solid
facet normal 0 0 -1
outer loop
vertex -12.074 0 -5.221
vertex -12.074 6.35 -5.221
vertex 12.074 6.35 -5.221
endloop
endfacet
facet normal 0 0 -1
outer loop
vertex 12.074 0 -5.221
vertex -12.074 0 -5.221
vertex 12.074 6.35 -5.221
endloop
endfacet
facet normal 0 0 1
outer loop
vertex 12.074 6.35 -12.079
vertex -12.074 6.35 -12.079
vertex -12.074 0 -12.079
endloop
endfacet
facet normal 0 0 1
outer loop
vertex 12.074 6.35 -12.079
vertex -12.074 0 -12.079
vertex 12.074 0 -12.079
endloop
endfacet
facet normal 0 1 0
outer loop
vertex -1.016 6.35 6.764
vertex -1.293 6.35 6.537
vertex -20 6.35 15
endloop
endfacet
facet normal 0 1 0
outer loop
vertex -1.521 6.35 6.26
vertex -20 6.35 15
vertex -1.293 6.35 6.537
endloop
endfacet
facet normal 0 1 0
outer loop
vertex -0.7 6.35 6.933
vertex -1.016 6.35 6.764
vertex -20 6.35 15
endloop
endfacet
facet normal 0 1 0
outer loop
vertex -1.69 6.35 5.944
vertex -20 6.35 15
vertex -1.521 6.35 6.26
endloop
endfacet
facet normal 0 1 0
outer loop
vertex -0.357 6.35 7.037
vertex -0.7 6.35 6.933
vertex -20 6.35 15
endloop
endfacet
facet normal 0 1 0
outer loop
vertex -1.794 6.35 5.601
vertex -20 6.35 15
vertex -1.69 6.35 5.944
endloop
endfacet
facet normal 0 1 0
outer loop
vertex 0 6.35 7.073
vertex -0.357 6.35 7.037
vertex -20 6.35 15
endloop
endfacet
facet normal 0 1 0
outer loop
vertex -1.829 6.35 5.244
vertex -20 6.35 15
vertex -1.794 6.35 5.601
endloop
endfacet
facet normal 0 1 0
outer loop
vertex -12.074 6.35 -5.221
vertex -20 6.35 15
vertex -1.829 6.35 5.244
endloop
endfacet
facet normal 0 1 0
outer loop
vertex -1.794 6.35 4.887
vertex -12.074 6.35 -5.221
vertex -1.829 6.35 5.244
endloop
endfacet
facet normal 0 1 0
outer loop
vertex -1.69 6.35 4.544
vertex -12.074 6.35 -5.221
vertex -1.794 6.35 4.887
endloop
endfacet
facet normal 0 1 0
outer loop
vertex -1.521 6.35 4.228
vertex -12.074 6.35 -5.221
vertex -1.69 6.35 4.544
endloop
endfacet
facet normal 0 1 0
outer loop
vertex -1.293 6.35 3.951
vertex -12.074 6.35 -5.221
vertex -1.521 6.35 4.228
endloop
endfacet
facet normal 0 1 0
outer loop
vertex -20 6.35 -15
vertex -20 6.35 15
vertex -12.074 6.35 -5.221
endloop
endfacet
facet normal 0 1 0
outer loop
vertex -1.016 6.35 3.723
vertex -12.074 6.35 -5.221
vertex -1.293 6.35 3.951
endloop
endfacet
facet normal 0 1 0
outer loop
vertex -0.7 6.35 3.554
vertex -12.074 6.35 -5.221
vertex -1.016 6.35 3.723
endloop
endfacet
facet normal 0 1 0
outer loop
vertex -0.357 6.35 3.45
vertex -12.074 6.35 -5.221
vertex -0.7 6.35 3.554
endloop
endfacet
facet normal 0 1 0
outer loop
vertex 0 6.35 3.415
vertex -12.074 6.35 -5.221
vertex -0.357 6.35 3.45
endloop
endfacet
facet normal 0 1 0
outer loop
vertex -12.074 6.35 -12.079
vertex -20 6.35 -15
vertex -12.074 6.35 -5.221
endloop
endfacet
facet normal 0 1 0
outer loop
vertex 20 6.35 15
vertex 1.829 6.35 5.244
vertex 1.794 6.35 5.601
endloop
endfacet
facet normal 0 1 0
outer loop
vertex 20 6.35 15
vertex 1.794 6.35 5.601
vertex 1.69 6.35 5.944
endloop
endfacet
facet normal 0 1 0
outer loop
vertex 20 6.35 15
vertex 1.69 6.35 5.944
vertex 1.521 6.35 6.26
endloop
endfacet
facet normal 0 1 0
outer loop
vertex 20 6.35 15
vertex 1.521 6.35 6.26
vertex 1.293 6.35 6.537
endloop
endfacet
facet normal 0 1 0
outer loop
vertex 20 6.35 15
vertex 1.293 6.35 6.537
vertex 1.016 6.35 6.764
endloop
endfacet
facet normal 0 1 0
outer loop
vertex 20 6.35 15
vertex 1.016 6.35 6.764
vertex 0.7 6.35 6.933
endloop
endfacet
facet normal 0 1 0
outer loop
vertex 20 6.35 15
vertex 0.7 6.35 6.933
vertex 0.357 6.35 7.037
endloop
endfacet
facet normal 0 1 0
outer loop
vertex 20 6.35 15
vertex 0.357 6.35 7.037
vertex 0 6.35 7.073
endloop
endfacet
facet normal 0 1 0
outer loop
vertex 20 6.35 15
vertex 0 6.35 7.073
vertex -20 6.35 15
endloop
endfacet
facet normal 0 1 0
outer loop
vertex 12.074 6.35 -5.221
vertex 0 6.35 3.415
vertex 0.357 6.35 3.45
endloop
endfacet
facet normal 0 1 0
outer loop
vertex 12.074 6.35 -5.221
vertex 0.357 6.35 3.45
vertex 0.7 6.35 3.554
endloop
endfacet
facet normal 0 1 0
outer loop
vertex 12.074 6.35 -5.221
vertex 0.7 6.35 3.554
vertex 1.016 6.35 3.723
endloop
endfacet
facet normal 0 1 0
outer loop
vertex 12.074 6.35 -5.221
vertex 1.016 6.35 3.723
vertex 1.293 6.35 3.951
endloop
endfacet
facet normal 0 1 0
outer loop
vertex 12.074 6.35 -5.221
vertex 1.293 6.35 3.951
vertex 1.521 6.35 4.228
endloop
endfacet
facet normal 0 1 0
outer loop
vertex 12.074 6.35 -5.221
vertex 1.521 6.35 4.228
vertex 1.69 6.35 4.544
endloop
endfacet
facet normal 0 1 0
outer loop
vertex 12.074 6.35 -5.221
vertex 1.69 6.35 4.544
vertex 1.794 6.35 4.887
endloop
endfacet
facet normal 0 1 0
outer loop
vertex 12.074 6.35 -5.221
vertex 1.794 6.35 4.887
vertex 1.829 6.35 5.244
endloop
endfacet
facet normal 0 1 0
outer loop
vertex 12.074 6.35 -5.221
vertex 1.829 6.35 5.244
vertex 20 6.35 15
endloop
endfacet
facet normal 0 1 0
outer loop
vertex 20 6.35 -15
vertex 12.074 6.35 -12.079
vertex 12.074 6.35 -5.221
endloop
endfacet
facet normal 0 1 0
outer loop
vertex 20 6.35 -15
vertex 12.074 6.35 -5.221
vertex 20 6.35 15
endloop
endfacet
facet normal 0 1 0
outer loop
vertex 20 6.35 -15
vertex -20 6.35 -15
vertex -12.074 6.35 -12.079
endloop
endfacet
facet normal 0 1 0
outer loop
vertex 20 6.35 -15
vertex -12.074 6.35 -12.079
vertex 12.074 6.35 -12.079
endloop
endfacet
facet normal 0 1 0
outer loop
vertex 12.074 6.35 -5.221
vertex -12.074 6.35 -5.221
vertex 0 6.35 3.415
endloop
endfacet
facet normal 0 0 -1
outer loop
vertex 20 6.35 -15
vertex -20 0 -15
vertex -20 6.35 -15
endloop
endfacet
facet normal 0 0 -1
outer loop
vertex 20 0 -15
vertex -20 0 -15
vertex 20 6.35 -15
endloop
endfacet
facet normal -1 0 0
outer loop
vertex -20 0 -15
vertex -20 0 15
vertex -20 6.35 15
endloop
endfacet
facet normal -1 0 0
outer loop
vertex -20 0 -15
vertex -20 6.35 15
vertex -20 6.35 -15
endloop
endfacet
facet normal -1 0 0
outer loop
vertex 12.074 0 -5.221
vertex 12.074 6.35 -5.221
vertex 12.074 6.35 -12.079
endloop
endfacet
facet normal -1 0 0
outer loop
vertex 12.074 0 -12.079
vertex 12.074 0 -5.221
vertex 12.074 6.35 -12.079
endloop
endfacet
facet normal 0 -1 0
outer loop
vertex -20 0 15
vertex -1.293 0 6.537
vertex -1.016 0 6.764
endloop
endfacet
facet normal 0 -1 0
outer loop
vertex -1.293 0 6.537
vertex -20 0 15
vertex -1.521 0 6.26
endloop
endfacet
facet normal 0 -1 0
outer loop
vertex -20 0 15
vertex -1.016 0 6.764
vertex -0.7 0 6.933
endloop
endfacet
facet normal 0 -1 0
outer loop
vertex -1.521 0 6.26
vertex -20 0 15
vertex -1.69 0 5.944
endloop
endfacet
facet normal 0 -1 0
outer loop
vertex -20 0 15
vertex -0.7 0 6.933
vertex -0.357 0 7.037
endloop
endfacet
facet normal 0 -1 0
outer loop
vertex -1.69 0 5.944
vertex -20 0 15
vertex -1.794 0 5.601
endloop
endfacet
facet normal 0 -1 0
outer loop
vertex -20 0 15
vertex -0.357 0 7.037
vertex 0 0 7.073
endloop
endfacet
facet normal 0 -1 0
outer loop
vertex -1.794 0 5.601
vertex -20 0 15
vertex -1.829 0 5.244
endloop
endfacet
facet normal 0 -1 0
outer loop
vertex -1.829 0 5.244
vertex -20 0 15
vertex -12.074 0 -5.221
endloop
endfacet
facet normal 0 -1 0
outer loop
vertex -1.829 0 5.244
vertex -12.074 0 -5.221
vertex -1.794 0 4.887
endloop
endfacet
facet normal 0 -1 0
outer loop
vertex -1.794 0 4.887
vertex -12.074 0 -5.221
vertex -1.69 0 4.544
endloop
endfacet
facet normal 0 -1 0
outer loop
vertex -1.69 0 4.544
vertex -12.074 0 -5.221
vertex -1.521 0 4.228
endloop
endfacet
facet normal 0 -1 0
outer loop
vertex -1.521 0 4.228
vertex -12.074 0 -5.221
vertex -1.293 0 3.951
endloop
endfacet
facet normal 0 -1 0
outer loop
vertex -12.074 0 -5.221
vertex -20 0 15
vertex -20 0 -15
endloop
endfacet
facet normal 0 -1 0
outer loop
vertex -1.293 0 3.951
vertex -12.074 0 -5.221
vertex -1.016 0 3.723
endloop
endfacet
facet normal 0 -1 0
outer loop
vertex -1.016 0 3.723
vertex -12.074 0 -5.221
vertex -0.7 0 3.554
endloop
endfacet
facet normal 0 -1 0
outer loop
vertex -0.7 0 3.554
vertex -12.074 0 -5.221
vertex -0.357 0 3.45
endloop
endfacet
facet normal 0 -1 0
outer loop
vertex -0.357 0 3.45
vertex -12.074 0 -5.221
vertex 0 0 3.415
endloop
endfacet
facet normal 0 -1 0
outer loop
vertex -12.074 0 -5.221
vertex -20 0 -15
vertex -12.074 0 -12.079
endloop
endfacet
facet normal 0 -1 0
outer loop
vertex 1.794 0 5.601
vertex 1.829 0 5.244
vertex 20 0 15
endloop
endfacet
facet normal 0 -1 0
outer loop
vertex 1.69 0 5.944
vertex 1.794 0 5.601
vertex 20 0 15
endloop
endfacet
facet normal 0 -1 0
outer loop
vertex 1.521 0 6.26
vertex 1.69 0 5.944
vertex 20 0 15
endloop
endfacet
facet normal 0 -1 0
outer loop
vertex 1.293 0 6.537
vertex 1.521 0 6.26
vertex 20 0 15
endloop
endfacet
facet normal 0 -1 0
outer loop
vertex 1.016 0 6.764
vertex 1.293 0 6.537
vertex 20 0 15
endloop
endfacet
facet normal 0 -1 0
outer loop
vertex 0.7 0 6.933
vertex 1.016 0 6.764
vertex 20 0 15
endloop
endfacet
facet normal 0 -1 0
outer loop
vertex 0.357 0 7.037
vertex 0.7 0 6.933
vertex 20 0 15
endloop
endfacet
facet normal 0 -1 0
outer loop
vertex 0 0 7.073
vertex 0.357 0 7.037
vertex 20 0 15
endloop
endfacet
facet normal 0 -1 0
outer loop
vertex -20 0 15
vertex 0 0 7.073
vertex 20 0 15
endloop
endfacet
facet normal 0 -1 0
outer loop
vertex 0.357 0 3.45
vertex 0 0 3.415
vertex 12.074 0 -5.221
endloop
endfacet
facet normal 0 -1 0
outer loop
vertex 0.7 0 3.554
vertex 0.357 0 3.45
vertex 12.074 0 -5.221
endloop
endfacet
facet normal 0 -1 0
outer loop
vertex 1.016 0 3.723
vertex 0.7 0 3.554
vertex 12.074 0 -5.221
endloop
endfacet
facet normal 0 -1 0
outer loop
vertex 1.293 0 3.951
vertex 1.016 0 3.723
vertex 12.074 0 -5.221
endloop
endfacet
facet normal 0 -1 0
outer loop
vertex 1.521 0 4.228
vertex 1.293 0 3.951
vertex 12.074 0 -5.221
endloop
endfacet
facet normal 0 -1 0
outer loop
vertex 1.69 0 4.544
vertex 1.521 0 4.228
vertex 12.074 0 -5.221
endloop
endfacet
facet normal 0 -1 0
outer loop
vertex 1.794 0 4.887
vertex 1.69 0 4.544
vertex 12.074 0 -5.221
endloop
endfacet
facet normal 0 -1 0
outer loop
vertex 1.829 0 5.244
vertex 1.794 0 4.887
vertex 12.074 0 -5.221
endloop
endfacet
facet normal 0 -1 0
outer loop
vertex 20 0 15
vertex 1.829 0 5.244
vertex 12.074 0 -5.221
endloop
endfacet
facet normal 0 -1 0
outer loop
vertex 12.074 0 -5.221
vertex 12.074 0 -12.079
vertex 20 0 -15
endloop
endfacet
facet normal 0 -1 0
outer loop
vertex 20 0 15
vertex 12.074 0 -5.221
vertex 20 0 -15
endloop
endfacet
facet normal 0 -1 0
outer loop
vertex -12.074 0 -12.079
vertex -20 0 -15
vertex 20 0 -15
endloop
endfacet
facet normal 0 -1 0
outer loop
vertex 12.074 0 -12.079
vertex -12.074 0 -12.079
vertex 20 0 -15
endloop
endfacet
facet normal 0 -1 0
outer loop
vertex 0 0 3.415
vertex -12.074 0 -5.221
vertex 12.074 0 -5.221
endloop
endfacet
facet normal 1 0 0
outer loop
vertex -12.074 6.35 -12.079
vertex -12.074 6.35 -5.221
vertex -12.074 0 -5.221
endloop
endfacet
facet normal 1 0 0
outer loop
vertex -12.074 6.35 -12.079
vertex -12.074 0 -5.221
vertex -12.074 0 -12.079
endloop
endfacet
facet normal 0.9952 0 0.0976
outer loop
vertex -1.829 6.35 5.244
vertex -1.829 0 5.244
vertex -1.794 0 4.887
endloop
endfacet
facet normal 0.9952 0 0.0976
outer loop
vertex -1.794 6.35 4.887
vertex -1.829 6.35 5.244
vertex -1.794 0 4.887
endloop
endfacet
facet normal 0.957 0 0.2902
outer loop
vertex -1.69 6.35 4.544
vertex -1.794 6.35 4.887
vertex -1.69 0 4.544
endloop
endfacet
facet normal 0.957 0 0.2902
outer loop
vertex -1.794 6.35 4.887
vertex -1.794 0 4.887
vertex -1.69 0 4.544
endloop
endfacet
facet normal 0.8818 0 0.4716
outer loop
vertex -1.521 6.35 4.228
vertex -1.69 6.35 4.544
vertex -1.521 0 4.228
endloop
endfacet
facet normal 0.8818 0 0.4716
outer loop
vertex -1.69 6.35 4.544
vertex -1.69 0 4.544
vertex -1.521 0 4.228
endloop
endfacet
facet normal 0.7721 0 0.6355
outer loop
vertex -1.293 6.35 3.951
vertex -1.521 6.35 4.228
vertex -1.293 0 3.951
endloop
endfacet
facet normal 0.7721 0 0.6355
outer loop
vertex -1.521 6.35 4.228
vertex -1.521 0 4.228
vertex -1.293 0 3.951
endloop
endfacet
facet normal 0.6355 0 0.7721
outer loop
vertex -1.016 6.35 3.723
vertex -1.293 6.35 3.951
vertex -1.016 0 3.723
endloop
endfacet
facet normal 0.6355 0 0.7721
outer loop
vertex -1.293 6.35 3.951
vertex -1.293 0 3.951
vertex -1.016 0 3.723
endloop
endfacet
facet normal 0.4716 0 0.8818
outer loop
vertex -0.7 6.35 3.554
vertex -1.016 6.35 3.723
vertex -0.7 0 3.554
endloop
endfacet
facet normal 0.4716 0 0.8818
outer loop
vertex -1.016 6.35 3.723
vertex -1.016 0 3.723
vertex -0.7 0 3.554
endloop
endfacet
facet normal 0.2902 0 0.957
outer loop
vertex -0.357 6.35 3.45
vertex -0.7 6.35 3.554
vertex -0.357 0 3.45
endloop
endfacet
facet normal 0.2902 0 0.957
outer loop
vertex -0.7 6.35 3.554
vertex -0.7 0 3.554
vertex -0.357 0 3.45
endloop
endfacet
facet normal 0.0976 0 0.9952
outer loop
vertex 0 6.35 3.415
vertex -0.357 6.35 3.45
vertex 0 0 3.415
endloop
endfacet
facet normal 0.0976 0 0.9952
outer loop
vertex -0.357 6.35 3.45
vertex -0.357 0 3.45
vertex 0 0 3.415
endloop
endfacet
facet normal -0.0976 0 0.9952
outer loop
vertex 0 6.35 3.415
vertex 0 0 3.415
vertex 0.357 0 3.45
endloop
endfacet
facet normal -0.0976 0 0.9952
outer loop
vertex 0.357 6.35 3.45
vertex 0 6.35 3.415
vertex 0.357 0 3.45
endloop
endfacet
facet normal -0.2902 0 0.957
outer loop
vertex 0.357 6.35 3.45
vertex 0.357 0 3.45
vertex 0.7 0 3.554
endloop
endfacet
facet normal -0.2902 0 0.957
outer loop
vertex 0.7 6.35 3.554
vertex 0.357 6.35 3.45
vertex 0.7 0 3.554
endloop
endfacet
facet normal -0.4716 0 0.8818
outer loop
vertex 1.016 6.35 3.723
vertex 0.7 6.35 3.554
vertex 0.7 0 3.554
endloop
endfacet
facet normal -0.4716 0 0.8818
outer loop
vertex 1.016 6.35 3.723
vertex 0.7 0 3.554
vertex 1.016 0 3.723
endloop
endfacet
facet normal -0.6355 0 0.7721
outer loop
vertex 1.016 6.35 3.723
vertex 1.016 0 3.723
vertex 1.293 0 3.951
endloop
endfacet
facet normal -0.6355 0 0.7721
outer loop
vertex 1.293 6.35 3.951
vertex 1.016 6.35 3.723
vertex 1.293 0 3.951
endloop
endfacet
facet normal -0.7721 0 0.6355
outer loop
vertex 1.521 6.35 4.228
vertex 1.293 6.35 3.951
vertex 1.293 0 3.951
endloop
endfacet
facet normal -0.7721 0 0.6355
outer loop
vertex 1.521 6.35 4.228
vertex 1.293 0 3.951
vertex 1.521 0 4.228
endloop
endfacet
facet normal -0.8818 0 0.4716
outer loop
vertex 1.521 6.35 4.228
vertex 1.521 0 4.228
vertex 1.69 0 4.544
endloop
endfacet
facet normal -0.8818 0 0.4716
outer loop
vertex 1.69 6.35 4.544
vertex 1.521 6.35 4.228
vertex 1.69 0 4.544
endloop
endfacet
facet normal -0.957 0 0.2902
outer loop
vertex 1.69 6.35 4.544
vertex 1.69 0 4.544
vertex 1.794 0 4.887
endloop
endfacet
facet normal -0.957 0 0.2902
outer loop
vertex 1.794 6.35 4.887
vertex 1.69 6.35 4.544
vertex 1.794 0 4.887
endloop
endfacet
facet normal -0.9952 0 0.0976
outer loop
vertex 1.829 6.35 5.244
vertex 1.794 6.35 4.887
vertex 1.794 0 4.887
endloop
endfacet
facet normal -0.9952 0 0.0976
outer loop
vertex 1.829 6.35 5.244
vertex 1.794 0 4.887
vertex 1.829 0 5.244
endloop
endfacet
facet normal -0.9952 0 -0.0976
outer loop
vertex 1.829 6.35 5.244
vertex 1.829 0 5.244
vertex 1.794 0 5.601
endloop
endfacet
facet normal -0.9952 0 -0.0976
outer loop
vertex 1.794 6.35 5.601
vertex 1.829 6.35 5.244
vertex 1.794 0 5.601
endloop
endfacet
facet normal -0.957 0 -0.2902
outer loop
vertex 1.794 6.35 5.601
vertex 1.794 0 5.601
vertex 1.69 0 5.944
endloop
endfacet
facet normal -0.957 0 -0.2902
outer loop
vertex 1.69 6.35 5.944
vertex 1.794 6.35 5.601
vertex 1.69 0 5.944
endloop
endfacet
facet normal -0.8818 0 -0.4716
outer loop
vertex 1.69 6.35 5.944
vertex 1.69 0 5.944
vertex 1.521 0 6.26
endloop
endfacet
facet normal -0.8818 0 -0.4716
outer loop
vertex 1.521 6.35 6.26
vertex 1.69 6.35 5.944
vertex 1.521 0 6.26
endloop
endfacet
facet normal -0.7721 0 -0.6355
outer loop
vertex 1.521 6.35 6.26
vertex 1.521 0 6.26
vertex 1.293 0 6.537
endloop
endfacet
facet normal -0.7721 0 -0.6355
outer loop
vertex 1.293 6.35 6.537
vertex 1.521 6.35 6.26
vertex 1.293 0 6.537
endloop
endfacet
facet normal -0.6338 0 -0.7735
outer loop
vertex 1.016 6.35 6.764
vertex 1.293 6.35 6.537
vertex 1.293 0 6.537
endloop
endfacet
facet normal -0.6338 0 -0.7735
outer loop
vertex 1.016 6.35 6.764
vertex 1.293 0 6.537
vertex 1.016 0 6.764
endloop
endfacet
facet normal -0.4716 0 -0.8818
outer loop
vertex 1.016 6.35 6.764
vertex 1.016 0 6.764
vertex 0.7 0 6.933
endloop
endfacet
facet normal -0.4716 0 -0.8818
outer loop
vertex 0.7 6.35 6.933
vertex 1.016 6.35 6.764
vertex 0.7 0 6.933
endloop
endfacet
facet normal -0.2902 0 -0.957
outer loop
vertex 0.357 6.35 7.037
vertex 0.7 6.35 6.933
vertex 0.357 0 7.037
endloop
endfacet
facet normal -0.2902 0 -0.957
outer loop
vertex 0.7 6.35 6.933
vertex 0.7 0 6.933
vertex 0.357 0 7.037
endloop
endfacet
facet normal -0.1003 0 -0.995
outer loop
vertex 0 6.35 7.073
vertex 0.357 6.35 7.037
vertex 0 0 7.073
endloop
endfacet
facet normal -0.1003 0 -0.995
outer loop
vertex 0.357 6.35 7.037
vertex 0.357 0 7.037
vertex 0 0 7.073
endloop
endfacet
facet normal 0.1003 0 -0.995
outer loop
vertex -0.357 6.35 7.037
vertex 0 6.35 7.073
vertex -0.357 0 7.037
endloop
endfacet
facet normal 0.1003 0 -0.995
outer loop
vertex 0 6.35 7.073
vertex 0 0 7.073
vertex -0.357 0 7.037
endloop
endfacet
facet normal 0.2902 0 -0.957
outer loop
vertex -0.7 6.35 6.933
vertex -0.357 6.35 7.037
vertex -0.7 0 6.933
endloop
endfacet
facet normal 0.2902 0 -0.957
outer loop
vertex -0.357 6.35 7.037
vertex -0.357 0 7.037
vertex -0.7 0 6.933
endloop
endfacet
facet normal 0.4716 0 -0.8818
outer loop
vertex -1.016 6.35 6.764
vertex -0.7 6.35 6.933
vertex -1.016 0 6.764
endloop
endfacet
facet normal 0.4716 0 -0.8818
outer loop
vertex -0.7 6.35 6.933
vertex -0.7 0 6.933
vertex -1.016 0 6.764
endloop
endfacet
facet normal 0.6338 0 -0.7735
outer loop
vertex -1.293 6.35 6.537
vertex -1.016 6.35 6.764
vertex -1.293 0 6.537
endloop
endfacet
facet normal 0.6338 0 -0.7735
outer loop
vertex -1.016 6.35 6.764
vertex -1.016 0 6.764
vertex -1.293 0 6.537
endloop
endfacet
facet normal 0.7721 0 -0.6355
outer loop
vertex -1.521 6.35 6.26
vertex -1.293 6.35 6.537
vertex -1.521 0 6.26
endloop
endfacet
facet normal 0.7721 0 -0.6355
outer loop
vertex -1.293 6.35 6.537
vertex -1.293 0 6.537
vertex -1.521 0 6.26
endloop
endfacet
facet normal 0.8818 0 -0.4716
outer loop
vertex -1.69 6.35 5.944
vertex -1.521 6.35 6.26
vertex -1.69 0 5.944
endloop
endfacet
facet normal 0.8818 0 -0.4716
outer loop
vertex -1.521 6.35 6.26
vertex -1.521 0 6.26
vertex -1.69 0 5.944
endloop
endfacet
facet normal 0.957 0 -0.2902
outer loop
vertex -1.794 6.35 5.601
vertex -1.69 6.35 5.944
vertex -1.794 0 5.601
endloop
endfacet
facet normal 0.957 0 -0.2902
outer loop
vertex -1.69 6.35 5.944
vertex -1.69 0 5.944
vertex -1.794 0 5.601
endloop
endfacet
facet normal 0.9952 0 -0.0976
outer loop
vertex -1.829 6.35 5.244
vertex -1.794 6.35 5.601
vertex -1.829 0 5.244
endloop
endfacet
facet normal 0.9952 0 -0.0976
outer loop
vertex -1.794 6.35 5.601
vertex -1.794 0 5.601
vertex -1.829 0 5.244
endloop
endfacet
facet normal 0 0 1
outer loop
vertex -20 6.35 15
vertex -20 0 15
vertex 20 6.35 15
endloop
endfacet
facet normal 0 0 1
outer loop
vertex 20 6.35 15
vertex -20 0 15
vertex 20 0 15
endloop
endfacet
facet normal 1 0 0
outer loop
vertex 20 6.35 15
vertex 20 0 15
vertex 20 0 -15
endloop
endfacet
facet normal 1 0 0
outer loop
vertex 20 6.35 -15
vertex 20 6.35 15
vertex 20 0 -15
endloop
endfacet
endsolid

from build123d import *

# Parameters (mm, degrees)
SKETCH1_W             = 40
SKETCH1_H             = 30
BOSS_EXTRUDE1_DEPTH   = 6.35
SKETCH2_W             = 24.148
SKETCH2_H             = 6.858
CUT_EXTRUDE1_DEPTH    = 7.35
F_6_CLEARANCE_HOLE1_D = 3.6576


with BuildPart() as part:
    # Sketch1 → Boss-Extrude1 (new body)
    with BuildSketch(Plane(origin=(0, 0, 0), x_dir=(1, 0, 0), z_dir=(0, 1, 0))):
        Rectangle(SKETCH1_W, SKETCH1_H)
    extrude(amount=BOSS_EXTRUDE1_DEPTH)

    # Sketch2 → Cut-Extrude1 (cut, through all)
    with BuildSketch(Plane(origin=(0, 6.35, 0), x_dir=(1, 0, 0), z_dir=(0, 1, 0))):
        with Locations((0, 8.65)):
            Rectangle(SKETCH2_W, SKETCH2_H)
    extrude(amount=-CUT_EXTRUDE1_DEPTH, mode=Mode.SUBTRACT)

    # #6 Clearance Hole1 (through all)
    with Locations(Plane(origin=(0, 6.35, 0), x_dir=(1, 0, 0), z_dir=(0, 1, 0))):
        with Locations((0, -5.2438)):
            Hole(F_6_CLEARANCE_HOLE1_D / 2)


solid = part.part
